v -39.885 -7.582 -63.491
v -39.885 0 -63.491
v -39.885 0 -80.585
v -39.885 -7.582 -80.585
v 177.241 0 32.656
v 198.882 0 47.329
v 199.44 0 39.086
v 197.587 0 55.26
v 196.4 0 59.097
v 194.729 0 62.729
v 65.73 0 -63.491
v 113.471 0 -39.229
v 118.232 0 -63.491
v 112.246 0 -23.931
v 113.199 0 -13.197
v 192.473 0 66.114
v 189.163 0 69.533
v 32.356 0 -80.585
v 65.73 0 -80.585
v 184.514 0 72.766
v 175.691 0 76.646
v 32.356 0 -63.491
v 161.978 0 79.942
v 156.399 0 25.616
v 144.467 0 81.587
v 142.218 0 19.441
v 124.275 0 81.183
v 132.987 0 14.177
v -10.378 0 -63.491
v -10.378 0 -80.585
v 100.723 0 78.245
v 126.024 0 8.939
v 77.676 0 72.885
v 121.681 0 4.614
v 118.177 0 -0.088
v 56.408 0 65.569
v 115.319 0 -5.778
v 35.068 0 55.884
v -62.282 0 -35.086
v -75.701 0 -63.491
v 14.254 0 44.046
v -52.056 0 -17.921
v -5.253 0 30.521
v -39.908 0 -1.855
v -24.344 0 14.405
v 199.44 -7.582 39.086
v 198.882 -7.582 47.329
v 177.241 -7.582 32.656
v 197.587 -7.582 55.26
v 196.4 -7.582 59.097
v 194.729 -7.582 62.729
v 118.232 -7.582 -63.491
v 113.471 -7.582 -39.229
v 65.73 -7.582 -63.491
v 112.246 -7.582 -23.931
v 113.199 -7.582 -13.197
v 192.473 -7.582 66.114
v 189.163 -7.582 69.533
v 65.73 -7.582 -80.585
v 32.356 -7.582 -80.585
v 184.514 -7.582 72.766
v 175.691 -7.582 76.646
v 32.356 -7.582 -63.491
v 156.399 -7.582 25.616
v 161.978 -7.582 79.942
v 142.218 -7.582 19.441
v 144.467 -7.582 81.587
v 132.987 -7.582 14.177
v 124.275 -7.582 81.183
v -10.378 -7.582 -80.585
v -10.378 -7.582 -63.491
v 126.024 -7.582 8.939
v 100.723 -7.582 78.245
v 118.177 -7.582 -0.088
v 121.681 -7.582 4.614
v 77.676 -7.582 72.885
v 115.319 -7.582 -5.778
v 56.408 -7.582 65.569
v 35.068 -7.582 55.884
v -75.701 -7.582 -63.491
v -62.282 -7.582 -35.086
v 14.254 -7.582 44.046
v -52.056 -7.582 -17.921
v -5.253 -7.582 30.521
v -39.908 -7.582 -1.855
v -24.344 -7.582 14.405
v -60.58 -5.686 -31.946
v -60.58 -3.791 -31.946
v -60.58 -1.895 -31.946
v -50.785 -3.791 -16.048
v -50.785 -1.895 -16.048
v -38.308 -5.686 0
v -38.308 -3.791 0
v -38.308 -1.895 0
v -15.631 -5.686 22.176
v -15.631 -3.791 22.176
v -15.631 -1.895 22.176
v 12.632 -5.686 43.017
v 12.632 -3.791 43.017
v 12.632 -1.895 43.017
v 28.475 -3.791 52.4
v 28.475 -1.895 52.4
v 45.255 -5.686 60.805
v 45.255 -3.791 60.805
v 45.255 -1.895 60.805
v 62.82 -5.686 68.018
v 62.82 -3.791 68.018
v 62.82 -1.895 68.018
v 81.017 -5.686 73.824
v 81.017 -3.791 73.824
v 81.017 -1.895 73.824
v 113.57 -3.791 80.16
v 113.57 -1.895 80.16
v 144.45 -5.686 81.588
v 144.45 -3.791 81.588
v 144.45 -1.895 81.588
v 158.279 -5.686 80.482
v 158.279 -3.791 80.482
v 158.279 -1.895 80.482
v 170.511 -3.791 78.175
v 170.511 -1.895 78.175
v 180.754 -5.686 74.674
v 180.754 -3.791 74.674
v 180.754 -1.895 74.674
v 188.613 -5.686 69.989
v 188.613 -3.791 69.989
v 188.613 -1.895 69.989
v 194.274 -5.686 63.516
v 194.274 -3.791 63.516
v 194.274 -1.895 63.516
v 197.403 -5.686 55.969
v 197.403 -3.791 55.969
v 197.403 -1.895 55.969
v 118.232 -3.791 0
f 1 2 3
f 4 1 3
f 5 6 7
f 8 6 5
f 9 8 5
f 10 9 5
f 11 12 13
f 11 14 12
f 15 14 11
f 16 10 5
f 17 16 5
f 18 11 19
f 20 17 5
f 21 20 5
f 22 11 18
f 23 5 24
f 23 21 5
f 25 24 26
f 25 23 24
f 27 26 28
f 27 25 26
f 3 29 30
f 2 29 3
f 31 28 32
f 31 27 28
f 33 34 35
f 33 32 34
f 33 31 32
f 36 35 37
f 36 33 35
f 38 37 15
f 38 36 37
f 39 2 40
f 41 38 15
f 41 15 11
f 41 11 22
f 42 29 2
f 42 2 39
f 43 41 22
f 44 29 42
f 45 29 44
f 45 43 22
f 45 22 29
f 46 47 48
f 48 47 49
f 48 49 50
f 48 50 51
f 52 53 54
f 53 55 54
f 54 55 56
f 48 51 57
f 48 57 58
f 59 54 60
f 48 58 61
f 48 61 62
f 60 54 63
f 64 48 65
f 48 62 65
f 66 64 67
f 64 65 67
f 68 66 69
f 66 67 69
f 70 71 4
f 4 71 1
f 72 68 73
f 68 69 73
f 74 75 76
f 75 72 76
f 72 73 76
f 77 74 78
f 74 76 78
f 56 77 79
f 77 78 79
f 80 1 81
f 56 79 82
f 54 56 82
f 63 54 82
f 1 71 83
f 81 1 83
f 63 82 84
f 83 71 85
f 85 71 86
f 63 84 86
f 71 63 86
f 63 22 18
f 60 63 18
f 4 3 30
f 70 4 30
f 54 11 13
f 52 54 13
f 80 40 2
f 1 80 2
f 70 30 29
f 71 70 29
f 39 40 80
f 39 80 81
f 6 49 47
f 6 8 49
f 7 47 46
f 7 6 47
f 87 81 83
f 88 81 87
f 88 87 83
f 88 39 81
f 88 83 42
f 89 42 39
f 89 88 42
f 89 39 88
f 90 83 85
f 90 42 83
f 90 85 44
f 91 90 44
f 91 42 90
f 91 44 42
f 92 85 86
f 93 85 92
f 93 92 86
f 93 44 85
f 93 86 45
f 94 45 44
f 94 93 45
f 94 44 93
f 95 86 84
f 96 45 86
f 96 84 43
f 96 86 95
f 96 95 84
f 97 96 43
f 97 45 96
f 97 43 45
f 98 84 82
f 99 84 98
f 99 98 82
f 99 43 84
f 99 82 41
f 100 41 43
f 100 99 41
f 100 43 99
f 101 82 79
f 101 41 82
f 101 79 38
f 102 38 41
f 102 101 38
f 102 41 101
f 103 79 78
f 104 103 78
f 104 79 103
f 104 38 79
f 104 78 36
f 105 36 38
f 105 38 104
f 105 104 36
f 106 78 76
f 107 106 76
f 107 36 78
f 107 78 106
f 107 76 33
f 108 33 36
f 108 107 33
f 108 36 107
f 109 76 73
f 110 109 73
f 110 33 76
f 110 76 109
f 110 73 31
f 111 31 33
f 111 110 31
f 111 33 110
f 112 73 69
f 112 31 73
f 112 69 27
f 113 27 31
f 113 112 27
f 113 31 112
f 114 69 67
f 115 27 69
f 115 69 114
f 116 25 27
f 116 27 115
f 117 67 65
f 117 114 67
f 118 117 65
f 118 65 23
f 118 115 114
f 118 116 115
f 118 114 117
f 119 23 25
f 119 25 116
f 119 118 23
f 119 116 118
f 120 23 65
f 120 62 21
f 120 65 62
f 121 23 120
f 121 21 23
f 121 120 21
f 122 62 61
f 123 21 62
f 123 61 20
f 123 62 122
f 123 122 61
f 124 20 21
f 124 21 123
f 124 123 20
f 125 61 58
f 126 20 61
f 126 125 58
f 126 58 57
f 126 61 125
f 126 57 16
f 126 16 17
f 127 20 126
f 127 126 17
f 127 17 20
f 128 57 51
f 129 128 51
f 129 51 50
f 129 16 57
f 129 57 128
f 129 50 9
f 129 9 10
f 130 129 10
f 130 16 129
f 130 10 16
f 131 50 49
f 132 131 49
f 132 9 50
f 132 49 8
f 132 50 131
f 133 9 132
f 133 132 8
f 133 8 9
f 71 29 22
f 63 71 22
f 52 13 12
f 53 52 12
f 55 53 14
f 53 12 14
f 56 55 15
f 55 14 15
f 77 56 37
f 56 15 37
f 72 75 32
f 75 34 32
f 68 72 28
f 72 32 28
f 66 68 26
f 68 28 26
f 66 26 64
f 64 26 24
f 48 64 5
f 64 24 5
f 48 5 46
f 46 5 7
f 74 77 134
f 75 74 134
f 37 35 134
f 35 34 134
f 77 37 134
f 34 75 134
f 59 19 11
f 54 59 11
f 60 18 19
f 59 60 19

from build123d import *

# Parameters (mm, degrees)
F1_DEPTH = 7.5815878808


with BuildPart() as f1:
    # F0 (on Front) → F1 (new body)
    with BuildSketch(Plane.XZ):
        with BuildLine():
            add(Edge.make_bspline(
                [(-75.7008343935, -63.4910315275), (-66.4144495165, -42.5052410316), (-44.313199633, 7.4401399217), (70.4376625664, 87.310867627), (197.1244228991, 83.2168178798), (198.8326732602, 50.659285161), (199.4398534298, 39.0864834189)],
                knots=[0, 0, 0, 0, 0.2349968569, 0.5592835382, 0.8433443789, 1, 1, 1, 1], degree=3))
            Line((-75.7008343935, -63.4910315275), (-39.8853719234, -63.4910315275))
            Line((-39.8853719234, -63.4910315275), (-39.8853719234, -80.5847793818))
            Line((-39.8853719234, -80.5847793818), (-10.378330946, -80.5847793818))
            Line((-10.378330946, -80.5847793818), (-10.378330946, -63.4910315275))
            Line((-10.378330946, -63.4910315275), (32.3560237885, -63.4910315275))
            Line((32.3560237885, -63.4910315275), (32.3560237885, -80.5847793818))
            Line((32.3560237885, -80.5847793818), (65.7295137644, -80.5847793818))
            Line((65.7295137644, -80.5847793818), (65.7295137644, -63.4910315275))
            Line((65.7295137644, -63.4910315275), (118.2317137718, -63.4910315275))
            add(Edge.make_bspline(
                [(118.2317137718, -63.4910315275), (113.0478281627, -39.9936732412), (101.6877351814, 11.499009198), (165.0119918313, 29.3702932045), (199.4398534298, 39.0864834189)],
                knots=[0, 0, 0, 0, 0.4563242345, 1, 1, 1, 1], degree=3))
        make_face()
    extrude(amount=F1_DEPTH)


solid = f1.part
